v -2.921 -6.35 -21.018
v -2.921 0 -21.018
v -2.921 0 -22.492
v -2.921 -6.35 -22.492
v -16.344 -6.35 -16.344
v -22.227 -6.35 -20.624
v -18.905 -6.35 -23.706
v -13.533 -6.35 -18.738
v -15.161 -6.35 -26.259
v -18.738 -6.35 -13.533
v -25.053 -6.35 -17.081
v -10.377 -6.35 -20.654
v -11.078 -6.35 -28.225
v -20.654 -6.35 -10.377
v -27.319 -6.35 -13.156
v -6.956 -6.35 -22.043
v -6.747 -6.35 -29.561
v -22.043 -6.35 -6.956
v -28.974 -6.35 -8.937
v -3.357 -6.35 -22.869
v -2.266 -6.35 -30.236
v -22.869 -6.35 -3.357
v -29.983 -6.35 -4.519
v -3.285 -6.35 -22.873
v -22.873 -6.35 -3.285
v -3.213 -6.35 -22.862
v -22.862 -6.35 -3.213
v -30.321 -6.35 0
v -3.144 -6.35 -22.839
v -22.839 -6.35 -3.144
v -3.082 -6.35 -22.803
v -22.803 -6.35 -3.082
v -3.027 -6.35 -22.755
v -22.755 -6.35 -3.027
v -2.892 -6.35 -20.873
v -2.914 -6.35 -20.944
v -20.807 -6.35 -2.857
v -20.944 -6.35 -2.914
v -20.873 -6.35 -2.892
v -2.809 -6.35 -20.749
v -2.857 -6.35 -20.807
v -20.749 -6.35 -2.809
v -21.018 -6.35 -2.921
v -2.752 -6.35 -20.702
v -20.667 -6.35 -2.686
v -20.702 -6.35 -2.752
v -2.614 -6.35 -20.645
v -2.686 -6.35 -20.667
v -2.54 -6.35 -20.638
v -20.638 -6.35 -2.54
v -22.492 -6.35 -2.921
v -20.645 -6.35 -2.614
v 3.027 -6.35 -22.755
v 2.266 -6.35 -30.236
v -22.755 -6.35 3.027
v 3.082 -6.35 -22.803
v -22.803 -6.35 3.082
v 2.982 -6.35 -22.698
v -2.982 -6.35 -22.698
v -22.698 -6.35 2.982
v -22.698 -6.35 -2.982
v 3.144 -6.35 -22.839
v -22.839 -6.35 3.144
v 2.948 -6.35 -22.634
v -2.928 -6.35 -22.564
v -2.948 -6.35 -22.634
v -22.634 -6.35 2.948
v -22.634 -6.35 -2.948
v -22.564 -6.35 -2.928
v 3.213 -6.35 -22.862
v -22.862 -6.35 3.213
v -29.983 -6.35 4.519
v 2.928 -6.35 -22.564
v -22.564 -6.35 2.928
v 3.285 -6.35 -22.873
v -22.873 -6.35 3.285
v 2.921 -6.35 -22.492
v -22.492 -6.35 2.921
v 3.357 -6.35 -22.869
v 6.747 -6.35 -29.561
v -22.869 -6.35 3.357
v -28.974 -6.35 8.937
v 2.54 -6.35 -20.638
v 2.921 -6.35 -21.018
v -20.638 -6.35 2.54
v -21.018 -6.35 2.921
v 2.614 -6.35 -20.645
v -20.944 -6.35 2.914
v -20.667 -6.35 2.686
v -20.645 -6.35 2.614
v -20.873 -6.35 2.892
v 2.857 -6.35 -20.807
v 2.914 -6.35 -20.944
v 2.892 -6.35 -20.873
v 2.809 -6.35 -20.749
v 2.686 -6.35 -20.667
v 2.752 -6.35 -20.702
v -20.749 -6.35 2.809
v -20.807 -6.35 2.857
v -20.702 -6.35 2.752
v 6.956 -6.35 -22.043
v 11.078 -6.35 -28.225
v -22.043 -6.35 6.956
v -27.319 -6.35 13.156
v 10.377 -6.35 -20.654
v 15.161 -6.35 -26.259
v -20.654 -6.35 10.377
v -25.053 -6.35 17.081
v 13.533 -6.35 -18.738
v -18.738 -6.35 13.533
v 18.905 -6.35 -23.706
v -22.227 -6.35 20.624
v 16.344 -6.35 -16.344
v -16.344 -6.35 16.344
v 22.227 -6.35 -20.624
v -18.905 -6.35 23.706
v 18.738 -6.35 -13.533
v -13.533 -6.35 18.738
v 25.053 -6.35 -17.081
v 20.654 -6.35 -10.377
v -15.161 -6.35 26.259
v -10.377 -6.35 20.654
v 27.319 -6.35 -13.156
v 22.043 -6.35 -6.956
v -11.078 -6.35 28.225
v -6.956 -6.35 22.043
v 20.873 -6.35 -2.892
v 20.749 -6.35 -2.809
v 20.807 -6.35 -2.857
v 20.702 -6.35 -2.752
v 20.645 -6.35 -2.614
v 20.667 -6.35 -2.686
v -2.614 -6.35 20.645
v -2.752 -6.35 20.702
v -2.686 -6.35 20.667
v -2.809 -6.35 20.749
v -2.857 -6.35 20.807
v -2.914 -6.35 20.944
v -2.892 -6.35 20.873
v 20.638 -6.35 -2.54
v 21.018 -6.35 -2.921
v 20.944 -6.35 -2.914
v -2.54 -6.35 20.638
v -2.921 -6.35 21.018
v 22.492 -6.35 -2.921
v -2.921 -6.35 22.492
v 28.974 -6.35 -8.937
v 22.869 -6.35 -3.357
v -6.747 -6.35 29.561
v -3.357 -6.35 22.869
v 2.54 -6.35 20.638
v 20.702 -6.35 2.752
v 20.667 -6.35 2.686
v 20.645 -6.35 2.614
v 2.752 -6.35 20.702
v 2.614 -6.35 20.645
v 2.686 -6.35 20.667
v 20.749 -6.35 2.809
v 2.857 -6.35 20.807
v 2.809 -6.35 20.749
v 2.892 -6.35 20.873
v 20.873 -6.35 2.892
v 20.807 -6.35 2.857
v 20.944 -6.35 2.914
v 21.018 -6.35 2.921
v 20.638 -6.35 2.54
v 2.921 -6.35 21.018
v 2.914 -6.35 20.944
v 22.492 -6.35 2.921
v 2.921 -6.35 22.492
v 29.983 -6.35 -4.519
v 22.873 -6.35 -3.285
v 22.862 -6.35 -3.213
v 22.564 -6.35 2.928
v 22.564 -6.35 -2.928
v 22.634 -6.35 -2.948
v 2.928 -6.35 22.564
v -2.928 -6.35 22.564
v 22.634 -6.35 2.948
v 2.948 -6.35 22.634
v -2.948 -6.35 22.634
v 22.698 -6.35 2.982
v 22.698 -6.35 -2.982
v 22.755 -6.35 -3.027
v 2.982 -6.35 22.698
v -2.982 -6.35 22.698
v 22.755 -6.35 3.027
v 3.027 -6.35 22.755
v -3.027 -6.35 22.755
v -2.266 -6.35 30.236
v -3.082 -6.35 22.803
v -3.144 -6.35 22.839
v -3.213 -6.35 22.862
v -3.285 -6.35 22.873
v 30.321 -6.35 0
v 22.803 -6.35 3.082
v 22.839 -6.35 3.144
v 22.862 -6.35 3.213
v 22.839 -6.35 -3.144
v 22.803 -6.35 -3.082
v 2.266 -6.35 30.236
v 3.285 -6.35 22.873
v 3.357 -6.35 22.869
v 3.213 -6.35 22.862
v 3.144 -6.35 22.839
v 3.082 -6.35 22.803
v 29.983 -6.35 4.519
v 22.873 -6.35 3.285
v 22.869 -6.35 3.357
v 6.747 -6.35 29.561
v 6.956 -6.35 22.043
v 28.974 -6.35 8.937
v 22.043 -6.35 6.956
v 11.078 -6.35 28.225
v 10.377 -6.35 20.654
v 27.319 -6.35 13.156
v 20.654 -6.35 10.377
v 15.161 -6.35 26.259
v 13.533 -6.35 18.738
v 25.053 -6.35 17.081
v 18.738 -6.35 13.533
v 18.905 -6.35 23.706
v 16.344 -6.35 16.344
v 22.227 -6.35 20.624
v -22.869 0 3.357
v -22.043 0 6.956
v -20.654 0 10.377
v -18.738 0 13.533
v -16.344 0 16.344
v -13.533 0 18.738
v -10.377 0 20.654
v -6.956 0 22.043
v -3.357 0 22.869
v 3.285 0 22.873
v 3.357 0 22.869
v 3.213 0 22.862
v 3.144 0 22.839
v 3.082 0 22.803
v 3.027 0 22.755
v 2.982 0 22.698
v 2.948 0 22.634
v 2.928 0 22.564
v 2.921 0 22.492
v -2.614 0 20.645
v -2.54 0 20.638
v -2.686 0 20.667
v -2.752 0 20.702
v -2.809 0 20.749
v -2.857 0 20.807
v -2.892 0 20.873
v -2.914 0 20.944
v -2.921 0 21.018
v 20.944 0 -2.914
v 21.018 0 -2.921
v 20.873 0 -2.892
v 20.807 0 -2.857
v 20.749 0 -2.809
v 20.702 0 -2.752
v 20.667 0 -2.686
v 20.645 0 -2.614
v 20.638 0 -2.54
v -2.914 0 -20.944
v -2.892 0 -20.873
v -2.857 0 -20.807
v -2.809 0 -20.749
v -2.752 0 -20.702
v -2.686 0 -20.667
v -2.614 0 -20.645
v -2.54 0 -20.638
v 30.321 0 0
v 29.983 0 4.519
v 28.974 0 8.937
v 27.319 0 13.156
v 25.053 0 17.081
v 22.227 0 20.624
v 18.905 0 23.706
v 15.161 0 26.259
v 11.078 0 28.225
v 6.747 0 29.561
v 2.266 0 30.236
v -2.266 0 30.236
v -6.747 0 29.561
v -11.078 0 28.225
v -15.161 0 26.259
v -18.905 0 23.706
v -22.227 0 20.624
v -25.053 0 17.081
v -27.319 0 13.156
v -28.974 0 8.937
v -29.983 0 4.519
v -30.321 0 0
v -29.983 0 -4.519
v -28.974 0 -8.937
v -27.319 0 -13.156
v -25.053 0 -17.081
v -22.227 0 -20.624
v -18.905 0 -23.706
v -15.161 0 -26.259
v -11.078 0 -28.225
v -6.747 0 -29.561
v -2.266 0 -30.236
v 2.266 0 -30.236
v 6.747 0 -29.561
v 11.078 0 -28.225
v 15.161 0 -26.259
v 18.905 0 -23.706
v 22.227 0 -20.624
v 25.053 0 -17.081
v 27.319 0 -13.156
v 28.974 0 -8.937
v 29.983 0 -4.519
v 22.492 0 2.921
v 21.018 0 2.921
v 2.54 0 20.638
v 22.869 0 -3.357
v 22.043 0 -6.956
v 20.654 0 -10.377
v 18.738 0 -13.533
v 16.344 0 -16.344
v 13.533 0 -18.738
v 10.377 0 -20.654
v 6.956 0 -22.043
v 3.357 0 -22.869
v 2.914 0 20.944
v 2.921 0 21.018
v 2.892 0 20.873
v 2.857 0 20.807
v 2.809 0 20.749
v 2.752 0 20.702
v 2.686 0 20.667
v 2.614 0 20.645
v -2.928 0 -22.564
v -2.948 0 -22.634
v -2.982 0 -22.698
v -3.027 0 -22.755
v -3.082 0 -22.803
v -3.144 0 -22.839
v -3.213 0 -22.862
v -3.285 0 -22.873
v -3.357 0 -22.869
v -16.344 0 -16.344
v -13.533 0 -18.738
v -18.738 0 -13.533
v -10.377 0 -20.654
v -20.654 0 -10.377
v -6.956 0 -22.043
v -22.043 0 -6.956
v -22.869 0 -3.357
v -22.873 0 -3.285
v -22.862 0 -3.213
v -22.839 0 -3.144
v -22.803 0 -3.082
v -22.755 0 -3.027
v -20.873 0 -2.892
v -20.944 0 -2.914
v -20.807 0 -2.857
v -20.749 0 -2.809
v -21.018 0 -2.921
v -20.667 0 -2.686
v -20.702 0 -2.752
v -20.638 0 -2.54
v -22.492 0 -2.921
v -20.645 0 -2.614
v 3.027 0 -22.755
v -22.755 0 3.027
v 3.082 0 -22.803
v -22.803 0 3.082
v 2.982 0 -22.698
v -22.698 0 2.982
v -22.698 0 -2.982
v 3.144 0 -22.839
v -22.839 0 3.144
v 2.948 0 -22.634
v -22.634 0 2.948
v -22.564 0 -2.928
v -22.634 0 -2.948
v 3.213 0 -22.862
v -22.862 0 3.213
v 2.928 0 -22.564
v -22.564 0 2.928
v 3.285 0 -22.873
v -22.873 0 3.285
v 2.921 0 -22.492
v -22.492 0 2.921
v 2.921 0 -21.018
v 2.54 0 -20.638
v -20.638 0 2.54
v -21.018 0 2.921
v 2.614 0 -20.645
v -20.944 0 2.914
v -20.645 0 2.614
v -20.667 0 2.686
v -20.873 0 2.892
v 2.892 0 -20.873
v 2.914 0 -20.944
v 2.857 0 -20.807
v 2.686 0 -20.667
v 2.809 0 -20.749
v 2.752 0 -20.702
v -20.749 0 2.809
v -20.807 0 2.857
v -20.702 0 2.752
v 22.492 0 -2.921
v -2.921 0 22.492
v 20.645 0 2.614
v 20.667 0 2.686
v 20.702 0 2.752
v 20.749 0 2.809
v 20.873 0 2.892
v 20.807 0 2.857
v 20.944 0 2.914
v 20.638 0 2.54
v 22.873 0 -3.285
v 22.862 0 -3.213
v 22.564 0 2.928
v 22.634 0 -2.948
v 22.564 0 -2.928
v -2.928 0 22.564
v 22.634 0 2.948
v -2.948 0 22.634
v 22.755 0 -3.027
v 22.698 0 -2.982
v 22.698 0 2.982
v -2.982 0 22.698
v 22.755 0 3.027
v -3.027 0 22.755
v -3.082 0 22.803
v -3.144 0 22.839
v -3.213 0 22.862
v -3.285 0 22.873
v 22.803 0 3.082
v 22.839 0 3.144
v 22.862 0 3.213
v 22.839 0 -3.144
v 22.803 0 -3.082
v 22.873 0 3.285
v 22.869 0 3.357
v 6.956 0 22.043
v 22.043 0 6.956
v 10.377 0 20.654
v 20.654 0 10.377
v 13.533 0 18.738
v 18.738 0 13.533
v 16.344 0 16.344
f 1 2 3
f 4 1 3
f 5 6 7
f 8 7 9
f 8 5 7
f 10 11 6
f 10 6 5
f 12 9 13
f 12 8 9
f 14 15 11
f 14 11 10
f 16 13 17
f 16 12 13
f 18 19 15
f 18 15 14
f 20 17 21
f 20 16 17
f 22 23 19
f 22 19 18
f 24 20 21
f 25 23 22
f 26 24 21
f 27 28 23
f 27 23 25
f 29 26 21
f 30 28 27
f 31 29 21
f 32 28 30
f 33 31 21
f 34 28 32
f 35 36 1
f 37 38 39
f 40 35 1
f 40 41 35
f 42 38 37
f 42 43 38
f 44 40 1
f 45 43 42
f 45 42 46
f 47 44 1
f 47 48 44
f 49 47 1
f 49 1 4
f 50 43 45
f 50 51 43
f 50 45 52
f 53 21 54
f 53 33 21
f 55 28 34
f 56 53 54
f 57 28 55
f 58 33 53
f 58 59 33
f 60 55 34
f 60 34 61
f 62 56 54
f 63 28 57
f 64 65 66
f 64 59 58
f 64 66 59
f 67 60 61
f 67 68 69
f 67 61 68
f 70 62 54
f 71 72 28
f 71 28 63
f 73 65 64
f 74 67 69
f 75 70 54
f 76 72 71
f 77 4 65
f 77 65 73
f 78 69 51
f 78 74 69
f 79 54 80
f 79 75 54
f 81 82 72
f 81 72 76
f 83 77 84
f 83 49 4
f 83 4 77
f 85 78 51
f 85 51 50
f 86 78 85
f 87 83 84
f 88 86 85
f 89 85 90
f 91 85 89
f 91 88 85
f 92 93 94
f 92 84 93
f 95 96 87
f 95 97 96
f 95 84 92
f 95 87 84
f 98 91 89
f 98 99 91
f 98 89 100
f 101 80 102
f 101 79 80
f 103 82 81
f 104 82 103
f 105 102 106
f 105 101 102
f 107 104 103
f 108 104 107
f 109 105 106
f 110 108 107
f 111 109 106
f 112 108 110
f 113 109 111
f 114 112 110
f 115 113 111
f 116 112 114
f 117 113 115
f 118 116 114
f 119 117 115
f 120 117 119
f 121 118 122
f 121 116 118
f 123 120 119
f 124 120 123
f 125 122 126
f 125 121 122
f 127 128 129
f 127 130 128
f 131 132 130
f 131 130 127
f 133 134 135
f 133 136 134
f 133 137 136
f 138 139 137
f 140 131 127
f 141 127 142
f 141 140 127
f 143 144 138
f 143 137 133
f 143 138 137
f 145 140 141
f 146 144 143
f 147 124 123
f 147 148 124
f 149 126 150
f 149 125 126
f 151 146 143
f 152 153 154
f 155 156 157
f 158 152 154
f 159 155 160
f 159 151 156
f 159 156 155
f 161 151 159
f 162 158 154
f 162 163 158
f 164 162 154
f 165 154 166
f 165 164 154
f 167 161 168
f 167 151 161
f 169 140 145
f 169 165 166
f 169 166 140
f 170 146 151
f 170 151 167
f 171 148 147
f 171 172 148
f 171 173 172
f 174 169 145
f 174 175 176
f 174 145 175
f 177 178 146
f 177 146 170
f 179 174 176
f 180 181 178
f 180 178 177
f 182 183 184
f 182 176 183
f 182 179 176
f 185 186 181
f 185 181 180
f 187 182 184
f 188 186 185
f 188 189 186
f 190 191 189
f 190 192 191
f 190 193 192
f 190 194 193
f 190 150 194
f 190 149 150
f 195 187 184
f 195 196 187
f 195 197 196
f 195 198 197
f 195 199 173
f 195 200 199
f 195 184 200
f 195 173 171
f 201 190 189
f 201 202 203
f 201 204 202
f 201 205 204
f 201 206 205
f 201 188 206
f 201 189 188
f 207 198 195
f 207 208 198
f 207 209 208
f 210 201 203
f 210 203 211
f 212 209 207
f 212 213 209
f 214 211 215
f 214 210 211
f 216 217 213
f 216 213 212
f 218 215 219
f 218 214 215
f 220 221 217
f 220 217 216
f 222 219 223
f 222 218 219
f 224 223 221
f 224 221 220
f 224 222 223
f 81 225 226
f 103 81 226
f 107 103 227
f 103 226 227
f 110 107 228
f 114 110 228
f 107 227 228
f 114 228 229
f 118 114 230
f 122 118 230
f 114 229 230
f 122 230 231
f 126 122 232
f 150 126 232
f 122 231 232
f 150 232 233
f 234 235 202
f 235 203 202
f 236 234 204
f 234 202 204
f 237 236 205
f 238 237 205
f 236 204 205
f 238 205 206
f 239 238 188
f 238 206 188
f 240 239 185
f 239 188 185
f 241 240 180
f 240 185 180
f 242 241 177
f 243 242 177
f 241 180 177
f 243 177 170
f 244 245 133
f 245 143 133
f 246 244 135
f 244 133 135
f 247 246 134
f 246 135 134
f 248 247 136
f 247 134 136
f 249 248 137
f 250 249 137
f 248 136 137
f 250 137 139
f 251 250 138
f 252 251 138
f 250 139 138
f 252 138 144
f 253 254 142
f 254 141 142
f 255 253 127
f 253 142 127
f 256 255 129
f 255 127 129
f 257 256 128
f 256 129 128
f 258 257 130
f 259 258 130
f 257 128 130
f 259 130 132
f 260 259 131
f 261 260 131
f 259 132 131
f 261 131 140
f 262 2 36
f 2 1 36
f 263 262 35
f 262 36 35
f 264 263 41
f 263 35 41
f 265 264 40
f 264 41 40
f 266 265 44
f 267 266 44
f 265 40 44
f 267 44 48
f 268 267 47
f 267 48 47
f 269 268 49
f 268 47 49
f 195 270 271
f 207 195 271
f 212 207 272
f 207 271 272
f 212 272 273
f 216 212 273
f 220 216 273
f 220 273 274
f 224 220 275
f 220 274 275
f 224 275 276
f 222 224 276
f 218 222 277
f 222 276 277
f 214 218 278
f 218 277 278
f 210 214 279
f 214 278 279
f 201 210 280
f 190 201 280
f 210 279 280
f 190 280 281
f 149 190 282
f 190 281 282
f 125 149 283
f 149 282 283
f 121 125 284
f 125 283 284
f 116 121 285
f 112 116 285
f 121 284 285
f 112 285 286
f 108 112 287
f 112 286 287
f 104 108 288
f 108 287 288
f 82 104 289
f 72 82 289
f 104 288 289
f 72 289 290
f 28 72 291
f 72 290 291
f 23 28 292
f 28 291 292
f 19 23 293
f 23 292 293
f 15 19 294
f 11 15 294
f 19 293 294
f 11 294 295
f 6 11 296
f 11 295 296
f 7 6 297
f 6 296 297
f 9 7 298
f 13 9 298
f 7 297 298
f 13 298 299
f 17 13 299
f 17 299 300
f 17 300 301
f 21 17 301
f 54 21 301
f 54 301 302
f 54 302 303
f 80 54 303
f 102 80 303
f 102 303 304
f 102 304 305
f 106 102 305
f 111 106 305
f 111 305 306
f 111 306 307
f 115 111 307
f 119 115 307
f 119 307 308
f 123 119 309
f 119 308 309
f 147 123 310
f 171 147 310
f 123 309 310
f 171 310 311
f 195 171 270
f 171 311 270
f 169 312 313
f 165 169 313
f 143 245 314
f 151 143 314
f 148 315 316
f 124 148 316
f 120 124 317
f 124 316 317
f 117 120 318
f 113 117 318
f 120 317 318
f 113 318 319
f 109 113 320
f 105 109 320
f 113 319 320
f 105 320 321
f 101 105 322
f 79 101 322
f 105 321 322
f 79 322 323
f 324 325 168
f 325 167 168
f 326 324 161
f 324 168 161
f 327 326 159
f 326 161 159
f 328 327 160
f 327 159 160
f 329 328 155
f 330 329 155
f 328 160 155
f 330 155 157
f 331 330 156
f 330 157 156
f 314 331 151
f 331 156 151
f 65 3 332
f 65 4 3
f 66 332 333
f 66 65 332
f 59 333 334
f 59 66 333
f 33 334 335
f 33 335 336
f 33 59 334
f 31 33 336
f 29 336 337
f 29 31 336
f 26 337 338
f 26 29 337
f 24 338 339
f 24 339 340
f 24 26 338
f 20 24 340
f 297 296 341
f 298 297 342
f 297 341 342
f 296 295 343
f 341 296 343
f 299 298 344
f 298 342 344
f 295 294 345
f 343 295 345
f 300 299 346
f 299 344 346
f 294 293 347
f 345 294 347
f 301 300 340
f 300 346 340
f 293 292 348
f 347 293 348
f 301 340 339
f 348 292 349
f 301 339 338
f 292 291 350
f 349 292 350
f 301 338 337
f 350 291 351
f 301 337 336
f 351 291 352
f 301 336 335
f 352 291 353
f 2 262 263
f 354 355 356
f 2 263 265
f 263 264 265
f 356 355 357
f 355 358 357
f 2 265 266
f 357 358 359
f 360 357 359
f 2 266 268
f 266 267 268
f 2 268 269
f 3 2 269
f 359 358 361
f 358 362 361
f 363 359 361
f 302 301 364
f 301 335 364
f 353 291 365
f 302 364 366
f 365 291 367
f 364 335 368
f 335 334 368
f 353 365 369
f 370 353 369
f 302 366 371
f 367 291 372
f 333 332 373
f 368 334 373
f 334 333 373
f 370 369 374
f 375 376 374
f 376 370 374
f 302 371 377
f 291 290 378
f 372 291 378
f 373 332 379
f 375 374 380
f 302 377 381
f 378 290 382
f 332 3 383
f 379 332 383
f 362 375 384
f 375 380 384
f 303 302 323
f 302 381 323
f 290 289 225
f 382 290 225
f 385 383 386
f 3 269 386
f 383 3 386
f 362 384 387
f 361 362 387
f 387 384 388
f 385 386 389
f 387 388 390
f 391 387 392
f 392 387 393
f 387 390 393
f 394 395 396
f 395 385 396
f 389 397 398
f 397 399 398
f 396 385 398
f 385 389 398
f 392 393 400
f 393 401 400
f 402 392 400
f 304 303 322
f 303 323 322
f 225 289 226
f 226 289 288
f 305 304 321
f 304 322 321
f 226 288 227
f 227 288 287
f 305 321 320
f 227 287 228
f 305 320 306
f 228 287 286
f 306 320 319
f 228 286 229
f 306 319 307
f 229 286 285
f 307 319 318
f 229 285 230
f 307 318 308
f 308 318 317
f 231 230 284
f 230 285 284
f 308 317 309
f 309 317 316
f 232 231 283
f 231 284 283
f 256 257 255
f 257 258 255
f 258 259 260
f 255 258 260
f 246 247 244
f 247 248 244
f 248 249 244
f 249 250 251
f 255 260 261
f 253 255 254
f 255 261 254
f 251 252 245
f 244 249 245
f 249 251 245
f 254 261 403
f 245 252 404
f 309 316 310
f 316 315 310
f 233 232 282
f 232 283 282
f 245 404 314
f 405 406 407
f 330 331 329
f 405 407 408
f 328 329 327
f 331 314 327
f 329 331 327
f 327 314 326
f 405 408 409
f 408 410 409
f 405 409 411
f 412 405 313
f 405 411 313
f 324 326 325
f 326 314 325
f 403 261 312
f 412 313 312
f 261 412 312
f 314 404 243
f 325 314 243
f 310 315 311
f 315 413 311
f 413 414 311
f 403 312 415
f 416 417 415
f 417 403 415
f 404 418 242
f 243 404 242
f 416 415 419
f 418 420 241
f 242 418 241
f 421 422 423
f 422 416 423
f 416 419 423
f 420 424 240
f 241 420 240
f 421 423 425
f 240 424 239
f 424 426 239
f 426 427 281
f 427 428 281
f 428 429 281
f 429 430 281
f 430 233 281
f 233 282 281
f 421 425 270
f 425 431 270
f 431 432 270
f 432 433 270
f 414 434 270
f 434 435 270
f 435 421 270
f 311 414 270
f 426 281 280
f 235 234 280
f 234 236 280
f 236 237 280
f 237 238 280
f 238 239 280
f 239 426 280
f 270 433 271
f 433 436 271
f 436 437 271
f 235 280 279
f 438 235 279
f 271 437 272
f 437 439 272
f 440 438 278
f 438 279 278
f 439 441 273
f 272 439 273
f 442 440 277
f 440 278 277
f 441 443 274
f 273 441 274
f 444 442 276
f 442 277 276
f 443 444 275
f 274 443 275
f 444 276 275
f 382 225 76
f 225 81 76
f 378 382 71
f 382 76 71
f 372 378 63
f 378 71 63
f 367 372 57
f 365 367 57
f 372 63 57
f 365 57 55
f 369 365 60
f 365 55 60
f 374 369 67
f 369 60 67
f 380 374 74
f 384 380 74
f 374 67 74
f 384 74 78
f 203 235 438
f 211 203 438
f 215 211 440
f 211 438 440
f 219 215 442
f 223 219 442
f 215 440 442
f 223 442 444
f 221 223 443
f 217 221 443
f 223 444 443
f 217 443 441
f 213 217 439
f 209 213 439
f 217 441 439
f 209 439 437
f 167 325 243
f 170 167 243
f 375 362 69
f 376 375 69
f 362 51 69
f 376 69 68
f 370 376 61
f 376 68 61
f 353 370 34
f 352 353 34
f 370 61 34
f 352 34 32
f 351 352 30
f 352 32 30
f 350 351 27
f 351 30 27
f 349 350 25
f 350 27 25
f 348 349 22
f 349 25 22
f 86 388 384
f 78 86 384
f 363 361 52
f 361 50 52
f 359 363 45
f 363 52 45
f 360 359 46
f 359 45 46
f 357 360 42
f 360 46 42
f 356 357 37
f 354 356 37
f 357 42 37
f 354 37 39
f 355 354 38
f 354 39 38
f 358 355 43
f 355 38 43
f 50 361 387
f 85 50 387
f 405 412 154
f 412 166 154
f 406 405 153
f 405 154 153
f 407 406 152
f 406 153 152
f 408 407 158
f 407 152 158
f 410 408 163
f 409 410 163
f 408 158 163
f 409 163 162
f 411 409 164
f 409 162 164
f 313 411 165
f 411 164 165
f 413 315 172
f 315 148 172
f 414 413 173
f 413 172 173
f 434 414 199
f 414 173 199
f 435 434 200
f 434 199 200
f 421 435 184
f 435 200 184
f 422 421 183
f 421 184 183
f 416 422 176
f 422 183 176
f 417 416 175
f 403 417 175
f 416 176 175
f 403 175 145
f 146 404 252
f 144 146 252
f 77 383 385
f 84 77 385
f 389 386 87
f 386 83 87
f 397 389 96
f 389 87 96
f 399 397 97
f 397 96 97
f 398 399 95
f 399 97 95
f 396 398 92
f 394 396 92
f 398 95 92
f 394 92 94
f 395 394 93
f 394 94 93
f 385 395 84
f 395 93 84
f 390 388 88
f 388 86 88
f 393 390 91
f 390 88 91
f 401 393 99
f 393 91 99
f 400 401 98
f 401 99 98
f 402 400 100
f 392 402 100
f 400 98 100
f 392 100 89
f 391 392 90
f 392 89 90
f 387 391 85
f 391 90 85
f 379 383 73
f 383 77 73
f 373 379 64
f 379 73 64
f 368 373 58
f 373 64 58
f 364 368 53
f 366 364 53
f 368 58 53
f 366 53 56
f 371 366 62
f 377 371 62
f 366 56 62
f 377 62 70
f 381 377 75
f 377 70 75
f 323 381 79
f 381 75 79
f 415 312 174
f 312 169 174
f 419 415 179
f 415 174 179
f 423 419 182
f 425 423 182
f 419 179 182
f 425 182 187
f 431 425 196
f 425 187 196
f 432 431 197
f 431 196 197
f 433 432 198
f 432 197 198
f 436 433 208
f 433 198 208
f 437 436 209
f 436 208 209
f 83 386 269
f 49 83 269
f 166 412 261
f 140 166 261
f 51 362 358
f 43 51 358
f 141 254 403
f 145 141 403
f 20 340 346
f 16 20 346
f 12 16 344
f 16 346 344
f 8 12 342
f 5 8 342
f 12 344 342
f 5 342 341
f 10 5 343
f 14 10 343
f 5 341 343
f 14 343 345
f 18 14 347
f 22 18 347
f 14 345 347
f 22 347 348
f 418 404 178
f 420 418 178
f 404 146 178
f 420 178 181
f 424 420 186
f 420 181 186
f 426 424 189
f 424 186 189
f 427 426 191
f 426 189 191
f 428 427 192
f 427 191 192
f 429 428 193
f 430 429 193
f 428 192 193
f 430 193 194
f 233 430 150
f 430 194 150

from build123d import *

# Parameters (mm, degrees)
F0_R     = 30.32125
F1_DEPTH = 6.35
F2_R     = 0.381


with BuildPart() as f1:
    # F0 (on Front) → F1 (new body)
    with BuildSketch(Plane.XZ):
        Circle(F0_R)
        with BuildLine():
            ThreePointArc((-2.921, -22.928688), (-16.344066, -16.344066), (-22.928688, -2.921))
            Line((-22.928688, -2.921), (-20.6375, -2.921))
            Line((-20.6375, -2.921), (-20.6375, 2.921))
            Line((-20.6375, 2.921), (-22.928688, 2.921))
            ThreePointArc((-22.928688, 2.921), (-16.344066, 16.344066), (-2.921, 22.928688))
            Line((-2.921, 22.928688), (-2.921, 20.6375))
            Line((-2.921, 20.6375), (2.921, 20.6375))
            Line((2.921, 20.6375), (2.921, 22.928688))
            ThreePointArc((2.921, 22.928688), (16.344066, 16.344066), (22.928688, 2.921))
            Line((22.928688, 2.921), (20.6375, 2.921))
            Line((20.6375, 2.921), (20.6375, -2.921))
            Line((20.6375, -2.921), (22.928688, -2.921))
            ThreePointArc((22.928688, -2.921), (16.344066, -16.344066), (2.921, -22.928688))
            Line((2.921, -22.928688), (2.921, -20.6375))
            Line((2.921, -20.6375), (-2.921, -20.6375))
            Line((-2.921, -20.6375), (-2.921, -22.928688))
        make_face(mode=Mode.SUBTRACT)
    extrude(amount=F1_DEPTH)

    # F2
    f2_edges = [f1.edges().sort_by_distance(p)[0] for p in [
        (-2.921, -3.175, 20.6375),
        (-2.921, -3.175, 22.928688),
        (2.921, -3.175, 20.6375),
        (-20.6375, -3.175, -2.921),
        (22.928688, -3.175, -2.921),
        (20.6375, -3.175, -2.921),
        (20.6375, -3.175, 2.921),
        (-2.921, -3.175, -20.6375),
        (2.921, -3.175, -20.6375),
        (-2.921, -3.175, -22.928688),
        (-20.6375, -3.175, 2.921),
        (22.928688, -3.175, 2.921),
        (2.921, -3.175, 22.928688),
        (-22.928688, -3.175, -2.921),
        (2.921, -3.175, -22.928688),
        (-22.928688, -3.175, 2.921),
    ]]
    fillet(f2_edges, radius=F2_R)


solid = f1.part
